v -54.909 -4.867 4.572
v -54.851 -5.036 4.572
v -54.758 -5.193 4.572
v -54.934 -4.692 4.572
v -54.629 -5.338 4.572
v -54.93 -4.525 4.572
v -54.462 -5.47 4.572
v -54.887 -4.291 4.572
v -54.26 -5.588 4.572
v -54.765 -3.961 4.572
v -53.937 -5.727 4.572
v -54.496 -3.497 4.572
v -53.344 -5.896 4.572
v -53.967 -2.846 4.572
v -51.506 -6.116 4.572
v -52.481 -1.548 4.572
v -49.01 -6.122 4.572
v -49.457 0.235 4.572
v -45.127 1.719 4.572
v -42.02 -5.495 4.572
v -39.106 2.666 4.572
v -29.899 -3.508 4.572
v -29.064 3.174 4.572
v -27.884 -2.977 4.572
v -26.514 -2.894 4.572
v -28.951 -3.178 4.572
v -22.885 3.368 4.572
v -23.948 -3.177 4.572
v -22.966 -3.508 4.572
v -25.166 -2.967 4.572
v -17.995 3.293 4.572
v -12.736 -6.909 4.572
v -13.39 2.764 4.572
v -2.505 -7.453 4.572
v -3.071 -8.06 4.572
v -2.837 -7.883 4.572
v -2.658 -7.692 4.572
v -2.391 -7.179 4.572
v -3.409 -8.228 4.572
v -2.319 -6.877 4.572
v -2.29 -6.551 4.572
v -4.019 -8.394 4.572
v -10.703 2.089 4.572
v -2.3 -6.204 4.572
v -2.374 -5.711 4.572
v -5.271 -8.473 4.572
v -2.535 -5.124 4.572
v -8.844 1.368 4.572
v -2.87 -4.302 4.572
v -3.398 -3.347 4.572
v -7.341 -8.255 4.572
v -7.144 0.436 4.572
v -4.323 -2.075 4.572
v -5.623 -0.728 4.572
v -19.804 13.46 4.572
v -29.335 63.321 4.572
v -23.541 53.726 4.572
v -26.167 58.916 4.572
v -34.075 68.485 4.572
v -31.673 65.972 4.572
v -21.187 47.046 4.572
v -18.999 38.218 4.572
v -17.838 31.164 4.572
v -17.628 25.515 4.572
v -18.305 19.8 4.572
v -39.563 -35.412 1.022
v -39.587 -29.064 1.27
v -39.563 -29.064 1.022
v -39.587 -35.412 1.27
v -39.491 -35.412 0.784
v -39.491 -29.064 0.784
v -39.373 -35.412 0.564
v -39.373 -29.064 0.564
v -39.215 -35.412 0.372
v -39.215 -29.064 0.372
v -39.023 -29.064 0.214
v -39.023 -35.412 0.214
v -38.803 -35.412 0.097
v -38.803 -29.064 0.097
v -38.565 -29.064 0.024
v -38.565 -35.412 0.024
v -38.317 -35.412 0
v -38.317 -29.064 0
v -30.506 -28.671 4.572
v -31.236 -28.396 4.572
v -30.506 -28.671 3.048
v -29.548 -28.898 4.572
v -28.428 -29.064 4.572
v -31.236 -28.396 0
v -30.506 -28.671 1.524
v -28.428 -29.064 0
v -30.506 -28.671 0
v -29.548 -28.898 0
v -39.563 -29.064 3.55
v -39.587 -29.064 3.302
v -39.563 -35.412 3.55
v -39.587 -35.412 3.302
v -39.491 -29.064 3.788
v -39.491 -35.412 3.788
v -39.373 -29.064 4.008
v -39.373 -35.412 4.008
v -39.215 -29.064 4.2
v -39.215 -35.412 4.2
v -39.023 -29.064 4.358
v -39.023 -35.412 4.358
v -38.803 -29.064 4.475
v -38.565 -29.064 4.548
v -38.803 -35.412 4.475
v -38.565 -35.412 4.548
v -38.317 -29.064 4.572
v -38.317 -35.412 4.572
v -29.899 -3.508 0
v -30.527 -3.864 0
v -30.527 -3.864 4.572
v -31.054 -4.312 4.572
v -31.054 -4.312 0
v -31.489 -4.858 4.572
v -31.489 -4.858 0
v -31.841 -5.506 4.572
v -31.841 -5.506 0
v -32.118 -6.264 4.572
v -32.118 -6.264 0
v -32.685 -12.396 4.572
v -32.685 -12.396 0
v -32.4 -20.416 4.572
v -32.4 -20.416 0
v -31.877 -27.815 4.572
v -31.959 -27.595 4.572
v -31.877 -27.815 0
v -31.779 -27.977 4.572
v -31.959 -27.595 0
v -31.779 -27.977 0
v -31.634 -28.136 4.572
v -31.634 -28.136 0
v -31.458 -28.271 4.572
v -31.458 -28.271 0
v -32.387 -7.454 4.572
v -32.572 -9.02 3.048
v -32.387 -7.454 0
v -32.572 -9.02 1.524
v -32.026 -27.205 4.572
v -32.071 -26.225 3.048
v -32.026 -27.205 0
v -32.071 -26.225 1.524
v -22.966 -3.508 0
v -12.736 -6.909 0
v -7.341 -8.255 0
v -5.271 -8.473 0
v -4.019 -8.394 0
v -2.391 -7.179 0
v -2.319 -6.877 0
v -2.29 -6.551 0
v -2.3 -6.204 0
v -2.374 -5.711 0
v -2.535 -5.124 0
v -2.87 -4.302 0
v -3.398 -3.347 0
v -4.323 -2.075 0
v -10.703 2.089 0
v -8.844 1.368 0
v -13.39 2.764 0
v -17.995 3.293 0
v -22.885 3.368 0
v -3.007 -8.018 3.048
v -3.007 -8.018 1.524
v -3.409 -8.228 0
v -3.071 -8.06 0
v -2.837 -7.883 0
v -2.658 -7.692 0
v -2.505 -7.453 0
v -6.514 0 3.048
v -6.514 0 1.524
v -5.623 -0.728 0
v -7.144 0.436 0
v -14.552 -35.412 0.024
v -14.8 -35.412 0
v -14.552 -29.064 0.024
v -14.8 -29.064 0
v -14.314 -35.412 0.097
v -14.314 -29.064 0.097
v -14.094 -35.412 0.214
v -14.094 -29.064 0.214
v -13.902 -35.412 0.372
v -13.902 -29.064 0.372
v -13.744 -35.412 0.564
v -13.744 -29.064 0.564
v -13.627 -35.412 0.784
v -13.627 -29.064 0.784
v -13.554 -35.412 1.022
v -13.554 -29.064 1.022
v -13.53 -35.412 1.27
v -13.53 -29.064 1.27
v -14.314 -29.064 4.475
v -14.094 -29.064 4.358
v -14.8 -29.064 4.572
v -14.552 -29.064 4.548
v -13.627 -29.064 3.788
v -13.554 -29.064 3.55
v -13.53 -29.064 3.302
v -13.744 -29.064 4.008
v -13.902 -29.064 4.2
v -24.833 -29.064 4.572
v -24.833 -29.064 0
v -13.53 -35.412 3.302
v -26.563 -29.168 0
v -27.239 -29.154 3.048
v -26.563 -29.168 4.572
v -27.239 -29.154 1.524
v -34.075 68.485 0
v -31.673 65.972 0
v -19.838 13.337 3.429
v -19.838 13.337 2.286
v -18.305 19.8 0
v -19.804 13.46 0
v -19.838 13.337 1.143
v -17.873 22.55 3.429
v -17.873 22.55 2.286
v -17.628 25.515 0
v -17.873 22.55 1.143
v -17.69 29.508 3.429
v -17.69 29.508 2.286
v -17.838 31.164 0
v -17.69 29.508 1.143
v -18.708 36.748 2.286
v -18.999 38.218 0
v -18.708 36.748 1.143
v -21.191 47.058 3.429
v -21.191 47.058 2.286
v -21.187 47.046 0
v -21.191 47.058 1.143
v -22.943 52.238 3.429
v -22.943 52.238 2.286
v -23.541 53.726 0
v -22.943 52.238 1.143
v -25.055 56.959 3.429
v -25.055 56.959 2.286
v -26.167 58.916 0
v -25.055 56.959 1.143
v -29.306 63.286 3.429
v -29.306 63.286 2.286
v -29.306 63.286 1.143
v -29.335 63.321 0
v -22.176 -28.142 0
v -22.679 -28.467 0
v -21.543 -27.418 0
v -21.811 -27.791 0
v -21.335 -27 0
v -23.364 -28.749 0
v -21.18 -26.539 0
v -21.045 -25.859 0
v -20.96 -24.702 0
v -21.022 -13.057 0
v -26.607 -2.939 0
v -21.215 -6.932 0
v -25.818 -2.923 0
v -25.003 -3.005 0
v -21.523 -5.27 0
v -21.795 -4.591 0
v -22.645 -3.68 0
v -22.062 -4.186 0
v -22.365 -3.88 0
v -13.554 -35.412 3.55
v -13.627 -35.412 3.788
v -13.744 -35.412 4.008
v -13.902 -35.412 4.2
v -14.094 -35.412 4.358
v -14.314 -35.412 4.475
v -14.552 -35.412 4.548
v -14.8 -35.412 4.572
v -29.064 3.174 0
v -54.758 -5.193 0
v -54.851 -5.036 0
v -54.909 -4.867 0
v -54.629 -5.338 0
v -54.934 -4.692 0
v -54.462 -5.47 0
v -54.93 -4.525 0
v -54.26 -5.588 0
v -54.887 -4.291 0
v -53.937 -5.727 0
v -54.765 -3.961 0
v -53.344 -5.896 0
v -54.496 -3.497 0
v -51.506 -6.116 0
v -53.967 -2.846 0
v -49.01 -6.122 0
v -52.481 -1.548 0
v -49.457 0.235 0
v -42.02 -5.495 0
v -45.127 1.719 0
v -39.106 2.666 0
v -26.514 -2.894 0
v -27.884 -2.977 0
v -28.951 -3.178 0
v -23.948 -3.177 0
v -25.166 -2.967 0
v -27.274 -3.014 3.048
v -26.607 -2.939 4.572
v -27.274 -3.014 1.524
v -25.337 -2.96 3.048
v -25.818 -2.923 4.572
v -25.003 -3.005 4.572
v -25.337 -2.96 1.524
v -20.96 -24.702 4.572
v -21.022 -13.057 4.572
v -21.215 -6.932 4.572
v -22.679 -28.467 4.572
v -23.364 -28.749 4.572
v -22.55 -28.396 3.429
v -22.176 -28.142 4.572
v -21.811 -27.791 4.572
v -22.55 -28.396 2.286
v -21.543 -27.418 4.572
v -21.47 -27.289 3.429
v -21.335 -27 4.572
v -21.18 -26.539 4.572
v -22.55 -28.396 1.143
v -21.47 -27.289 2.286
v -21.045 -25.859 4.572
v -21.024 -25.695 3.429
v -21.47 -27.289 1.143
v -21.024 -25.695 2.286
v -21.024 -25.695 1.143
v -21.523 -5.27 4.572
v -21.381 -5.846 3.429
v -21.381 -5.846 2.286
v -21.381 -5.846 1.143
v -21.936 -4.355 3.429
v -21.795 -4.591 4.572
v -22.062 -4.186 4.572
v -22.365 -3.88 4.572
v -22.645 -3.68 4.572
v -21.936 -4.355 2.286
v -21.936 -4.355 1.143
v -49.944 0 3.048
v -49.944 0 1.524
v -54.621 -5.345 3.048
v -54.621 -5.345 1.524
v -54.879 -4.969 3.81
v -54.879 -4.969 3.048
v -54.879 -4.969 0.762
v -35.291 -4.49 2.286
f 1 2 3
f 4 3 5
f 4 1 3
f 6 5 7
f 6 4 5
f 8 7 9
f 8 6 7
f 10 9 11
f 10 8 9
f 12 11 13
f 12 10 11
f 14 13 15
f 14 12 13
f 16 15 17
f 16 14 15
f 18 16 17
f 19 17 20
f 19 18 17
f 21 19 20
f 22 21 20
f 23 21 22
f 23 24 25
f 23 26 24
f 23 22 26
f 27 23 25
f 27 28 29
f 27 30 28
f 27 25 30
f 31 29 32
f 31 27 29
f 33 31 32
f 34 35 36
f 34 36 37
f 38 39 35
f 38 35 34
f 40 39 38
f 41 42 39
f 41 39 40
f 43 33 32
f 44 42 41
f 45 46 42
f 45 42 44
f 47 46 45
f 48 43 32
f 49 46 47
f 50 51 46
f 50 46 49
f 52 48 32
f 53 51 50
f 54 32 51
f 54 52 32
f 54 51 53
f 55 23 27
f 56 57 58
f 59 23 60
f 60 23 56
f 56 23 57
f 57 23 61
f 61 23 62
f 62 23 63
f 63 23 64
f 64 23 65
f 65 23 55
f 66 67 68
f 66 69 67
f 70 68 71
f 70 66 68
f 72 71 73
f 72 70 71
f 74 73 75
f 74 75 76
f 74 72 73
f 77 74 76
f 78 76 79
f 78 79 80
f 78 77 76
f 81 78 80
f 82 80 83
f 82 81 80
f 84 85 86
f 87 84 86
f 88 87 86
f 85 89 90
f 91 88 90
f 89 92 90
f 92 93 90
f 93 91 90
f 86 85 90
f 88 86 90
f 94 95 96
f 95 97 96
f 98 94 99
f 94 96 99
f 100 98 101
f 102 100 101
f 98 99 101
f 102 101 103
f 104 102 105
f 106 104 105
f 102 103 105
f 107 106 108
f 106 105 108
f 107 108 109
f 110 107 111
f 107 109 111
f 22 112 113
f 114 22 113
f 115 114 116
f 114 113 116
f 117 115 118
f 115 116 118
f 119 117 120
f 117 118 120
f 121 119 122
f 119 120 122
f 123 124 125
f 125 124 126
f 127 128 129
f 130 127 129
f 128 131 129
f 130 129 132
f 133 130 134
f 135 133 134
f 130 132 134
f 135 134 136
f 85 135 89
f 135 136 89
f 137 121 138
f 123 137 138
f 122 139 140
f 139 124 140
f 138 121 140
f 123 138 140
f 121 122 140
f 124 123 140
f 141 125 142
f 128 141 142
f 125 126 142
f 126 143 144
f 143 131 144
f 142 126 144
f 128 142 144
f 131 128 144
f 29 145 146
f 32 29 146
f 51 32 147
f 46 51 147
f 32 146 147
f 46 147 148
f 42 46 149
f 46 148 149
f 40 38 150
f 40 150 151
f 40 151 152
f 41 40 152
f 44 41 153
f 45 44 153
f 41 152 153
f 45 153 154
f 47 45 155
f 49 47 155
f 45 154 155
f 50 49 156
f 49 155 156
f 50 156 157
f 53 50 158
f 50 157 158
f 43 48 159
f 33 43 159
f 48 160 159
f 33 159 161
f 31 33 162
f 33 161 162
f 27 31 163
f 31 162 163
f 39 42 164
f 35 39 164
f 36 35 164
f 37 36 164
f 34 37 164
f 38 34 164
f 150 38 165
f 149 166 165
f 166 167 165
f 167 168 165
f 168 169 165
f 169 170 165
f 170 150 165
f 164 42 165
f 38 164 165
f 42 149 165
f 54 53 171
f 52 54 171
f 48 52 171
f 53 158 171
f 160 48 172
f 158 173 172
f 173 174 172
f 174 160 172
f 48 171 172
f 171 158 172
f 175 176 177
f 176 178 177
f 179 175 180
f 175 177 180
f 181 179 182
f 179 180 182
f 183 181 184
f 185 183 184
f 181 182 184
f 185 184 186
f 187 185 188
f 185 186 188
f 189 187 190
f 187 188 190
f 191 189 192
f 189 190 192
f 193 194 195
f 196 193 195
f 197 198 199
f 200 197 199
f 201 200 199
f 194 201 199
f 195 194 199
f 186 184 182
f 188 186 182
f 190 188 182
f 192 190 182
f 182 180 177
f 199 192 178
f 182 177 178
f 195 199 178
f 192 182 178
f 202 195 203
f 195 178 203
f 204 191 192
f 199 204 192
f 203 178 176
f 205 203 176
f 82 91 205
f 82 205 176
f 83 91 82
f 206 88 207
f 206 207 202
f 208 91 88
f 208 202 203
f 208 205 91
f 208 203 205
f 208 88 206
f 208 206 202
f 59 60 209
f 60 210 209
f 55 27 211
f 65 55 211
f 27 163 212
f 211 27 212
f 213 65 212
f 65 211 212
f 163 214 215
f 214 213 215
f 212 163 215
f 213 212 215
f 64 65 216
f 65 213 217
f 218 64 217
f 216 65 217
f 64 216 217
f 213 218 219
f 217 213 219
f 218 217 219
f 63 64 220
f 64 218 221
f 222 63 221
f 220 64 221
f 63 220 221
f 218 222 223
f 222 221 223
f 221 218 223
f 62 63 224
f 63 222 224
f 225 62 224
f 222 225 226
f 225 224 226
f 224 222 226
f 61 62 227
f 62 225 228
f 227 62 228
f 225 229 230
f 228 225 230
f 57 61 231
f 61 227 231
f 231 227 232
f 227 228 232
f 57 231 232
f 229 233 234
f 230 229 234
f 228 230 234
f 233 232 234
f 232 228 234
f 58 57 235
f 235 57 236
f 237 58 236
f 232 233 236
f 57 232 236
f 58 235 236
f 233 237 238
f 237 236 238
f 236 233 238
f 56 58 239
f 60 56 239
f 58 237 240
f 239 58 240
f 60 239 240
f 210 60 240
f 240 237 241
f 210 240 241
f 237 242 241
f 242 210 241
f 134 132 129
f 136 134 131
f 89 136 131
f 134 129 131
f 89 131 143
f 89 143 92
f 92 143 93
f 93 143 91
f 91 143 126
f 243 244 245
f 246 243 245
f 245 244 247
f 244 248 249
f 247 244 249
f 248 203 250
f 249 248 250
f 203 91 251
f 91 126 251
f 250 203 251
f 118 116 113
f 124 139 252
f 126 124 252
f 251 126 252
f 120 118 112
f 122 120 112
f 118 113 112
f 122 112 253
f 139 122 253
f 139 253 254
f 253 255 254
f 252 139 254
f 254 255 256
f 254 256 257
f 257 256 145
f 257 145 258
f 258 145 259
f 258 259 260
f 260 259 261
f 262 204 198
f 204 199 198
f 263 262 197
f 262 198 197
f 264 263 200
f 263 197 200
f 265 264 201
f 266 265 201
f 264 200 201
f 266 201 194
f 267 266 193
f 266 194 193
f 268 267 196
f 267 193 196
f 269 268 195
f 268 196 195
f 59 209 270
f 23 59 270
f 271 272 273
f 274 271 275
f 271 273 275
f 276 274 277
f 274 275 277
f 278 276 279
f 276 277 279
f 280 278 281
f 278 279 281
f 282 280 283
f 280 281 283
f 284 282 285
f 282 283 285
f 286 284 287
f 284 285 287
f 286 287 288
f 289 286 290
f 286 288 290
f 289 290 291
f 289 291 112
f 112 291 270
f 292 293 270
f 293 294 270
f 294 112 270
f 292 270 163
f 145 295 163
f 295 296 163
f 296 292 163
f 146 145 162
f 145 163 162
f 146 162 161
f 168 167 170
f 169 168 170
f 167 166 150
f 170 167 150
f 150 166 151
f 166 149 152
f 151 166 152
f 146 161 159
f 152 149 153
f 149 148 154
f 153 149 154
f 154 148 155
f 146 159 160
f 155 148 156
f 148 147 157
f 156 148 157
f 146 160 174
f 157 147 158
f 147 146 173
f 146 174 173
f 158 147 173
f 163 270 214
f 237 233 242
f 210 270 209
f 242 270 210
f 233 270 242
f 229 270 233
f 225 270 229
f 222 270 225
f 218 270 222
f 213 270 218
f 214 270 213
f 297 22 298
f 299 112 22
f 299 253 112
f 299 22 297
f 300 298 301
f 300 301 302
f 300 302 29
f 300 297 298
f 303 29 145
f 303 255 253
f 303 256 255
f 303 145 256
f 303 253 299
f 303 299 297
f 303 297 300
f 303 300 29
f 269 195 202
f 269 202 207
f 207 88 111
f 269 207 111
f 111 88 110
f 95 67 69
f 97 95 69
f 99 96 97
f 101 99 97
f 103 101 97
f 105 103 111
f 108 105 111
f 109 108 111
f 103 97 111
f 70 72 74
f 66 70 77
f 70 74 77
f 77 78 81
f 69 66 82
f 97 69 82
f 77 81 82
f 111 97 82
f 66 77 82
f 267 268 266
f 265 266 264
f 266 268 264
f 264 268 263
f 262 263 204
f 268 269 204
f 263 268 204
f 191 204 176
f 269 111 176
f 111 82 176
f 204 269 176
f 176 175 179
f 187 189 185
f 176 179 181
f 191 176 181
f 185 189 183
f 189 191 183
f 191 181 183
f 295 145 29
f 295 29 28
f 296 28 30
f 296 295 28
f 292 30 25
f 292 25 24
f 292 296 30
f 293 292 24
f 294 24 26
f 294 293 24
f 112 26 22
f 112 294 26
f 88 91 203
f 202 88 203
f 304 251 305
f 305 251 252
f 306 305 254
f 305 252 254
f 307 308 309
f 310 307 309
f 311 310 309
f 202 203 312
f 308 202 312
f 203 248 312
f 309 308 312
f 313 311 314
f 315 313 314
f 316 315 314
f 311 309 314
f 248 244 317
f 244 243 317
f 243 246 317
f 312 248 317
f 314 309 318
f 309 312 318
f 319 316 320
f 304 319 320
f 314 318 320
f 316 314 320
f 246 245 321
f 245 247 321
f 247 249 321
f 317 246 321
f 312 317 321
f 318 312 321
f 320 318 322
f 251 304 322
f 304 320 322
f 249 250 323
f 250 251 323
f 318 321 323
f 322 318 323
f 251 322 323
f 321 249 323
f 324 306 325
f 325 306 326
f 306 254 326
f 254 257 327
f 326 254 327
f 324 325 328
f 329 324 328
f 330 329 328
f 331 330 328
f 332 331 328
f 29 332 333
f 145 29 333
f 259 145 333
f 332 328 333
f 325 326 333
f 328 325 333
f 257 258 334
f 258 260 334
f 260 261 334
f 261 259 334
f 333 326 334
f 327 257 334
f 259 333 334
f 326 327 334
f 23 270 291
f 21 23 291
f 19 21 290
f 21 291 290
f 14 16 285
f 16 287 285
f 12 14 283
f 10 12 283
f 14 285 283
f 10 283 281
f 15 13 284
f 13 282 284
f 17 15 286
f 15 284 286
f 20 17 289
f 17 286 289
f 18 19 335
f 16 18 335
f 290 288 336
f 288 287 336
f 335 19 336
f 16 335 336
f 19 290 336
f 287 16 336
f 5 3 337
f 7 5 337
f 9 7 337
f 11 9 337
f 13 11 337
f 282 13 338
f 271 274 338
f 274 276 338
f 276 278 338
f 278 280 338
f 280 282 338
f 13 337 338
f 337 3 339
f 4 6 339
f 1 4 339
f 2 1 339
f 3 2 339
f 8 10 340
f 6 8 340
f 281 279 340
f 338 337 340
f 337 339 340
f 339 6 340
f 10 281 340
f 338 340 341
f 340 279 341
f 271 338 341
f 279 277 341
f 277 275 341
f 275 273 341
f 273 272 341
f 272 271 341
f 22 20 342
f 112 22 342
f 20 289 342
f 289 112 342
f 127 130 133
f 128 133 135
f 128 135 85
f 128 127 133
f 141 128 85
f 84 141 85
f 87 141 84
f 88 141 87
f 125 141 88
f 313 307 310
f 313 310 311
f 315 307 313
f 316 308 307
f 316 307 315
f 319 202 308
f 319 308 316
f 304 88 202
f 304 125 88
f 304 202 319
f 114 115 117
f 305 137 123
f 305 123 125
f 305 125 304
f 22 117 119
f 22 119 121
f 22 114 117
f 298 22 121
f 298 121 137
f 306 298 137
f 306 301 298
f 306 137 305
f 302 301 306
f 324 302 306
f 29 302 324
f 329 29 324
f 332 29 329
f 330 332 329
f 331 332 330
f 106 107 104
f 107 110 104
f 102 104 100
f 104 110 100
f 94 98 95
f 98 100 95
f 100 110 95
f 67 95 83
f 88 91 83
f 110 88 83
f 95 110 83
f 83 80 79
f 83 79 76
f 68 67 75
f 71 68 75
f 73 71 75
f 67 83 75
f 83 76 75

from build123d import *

# Parameters (mm, degrees)
F1_DEPTH = 4.572
F2_R     = 1.27
F3_R     = 1.27
F4_R     = 1.27
F5_R     = 1.27


with BuildPart() as f1:
    # F0 (on Top) → F1 (new body)
    with BuildSketch(Plane.XY):
        with BuildLine():
            add(Edge.make_bspline(
                [(-29.8993531615, -3.5077452194), (-31.6703462632, -4.3197464152), (-33.4416768807, -8.8355358115), (-31.9008991214, -26.0699501287), (-32.073712776, -27.9811963987), (-31.2356371433, -28.3960327506)],
                knots=[0.6307578864, 0.6307578864, 0.6307578864, 0.6307578864, 0.7429048342, 0.9308873949, 1, 1, 1, 1], degree=3))
            add(Edge.make_bspline(
                [(-31.2356371433, -28.3960327506), (-30.6428751172, -28.6894421123), (-29.6076188044, -28.9333524282), (-28.4280432172, -29.0641747415)],
                knots=[0, 0, 0, 0, 0.0488826142, 0.0488826142, 0.0488826142, 0.0488826142], degree=3))
            Line((-28.4280432172, -29.0641747415), (-24.8331572694, -29.0641747415))
            add(Edge.make_bspline(
                [(-24.8331572694, -29.0641747415), (-23.9456810218, -28.9502333326), (-20.4658515137, -28.0253654937), (-21.4945827069, -21.0427899664), (-20.5497100233, -6.2066091766), (-22.0747955225, -3.9219376818), (-22.9658381019, -3.5077452194)],
                knots=[0.0966734598, 0.0966734598, 0.0966734598, 0.0966734598, 0.1335391331, 0.2562819752, 0.4339266036, 0.5047742263, 0.5047742263, 0.5047742263, 0.5047742263], degree=3))
            add(Edge.make_bspline(
                [(-29.8993531615, -3.5077452194), (-26.5539886397, -2.8472558093), (-25.9297526703, -2.6050307792), (-22.9658381019, -3.5077452194)],
                knots=[0.4512013353, 0.4512013353, 0.4512013353, 0.4512013353, 0.548270897, 0.548270897, 0.548270897, 0.548270897], degree=3))
        make_face()
    extrude(amount=F1_DEPTH)


with BuildPart() as f1b:
    # F0 (on Top) → F1, piece 2 (new body)
    with BuildSketch(Plane.XY):
        with BuildLine():
            add(Edge.make_bspline(
                [(-28.4280432172, -29.0641747415), (-27.2748128564, -29.1920752043), (-25.9836378271, -29.2118827799), (-24.8331572694, -29.0641747415)],
                knots=[0.0488826142, 0.0488826142, 0.0488826142, 0.0488826142, 0.0966734598, 0.0966734598, 0.0966734598, 0.0966734598], degree=3))
            Line((-28.4280432172, -29.0641747415), (-39.5874110982, -29.0641747415))
            Line((-39.5874110982, -29.0641747415), (-39.5874110982, -35.4115255177))
            Line((-39.5874110982, -35.4115255177), (-13.5298753157, -35.4115255177))
            Line((-13.5298753157, -35.4115255177), (-13.5298753157, -29.0641747415))
            Line((-13.5298753157, -29.0641747415), (-24.8331572694, -29.0641747415))
        make_face()
    extrude(amount=F1_DEPTH)

    # F2
    f2_edges = [f1b.edges().sort_by_distance(p)[0] for p in [
        (-39.587411, -32.23785, 4.572),
    ]]
    fillet(f2_edges, radius=F2_R)

    # F3
    f3_edges = [f1b.edges().sort_by_distance(p)[0] for p in [
        (-39.587411, -32.23785, 0),
    ]]
    fillet(f3_edges, radius=F3_R)

    # F4
    f4_edges = [f1b.edges().sort_by_distance(p)[0] for p in [
        (-13.529875, -32.23785, 0),
    ]]
    fillet(f4_edges, radius=F4_R)

    # F5
    f5_edges = [f1b.edges().sort_by_distance(p)[0] for p in [
        (-13.529875, -32.23785, 4.572),
    ]]
    fillet(f5_edges, radius=F5_R)


with BuildPart() as f1c:
    # F0 (on Top) → F1, piece 3 (new body)
    with BuildSketch(Plane.XY):
        with BuildLine():
            add(Edge.make_bspline(
                [(-29.0641766042, 3.1736744568), (-36.9995706334, 2.8839279058), (-48.5838670621, 2.7774177029), (-60.872789795, -8.9698768638), (-36.2249289881, -4.7566303017), (-29.8993531615, -3.5077452194)],
                knots=[0, 0, 0, 0, 0.1694125769, 0.2676575484, 0.4512013353, 0.4512013353, 0.4512013353, 0.4512013353], degree=3))
            add(Edge.make_bspline(
                [(-22.9658381019, -3.5077452194), (-23.0955860892, -3.4474331315), (-24.7982012469, -2.7723188561), (-28.0727680061, -2.67025504), (-29.8993531615, -3.5077452194)],
                knots=[0.5047742263, 0.5047742263, 0.5047742263, 0.5047742263, 0.5150906092, 0.6307578864, 0.6307578864, 0.6307578864, 0.6307578864], degree=3))
            add(Edge.make_bspline(
                [(-22.9658381019, -3.5077452194), (-17.8740876083, -5.0585310435), (1.968128388, -13.2122424462), (-5.6130342206, 2.6563547922), (-16.6332168416, 3.4628720663), (-22.8846012587, 3.3684871276)],
                knots=[0.548270897, 0.548270897, 0.548270897, 0.548270897, 0.7150280613, 0.824083244, 0.9564302387, 0.9564302387, 0.9564302387, 0.9564302387], degree=3))
            add(Edge.make_bspline(
                [(-22.8846012587, 3.3684871276), (-24.942610411, 3.3374147995), (-27.023340973, 3.2481918762), (-29.0641766042, 3.1736744568)],
                knots=[0.9564302387, 0.9564302387, 0.9564302387, 0.9564302387, 1, 1, 1, 1], degree=3))
        make_face()
        with BuildLine():
            Line((-34.0752415359, 68.4845522046), (-29.0641766042, 3.1736744568))
            add(Edge.make_bspline(
                [(-22.8846012587, 3.3684871276), (-24.942610411, 3.3374147995), (-27.023340973, 3.2481918762), (-29.0641766042, 3.1736744568)],
                knots=[0.9564302387, 0.9564302387, 0.9564302387, 0.9564302387, 1, 1, 1, 1], degree=3))
            add(Edge.make_bspline(
                [(-22.8846012587, 3.3684871276), (-20.7332880928, 10.0991858385), (-16.7589477096, 22.5245770204), (-18.2384375016, 36.5615536627), (-23.7070572199, 57.7855641977), (-30.8381753552, 65.1442313261), (-34.0752415359, 68.4845522046)],
                knots=[0, 0, 0, 0, 0.2673865788, 0.4938609679, 0.7702621718, 1, 1, 1, 1], degree=3))
        make_face()
    extrude(amount=F1_DEPTH)


solid = Compound([f1.part, f1b.part, f1c.part])
